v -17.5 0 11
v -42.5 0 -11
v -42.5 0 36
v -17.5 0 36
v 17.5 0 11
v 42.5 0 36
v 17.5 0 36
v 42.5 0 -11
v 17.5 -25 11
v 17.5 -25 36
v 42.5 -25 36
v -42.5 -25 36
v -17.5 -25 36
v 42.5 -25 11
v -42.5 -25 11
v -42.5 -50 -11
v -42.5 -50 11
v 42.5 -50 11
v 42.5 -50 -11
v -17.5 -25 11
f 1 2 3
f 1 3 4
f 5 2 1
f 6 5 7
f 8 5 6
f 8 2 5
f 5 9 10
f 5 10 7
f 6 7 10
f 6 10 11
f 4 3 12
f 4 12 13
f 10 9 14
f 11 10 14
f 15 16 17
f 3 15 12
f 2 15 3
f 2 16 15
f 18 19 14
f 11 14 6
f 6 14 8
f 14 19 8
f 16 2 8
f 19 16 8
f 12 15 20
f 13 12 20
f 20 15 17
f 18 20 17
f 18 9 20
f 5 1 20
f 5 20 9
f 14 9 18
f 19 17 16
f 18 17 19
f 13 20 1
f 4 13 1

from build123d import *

# Parameters (mm, degrees)
F0_W     = 85
F0_H     = 22
F1_DEPTH = 50
F2_W     = 25
F2_H     = 25
F3_DEPTH = 25
F4_W     = 25
F4_H     = 25
F5_DEPTH = 25


with BuildPart() as f1:
    # F0 (on Front) → F1 (new body)
    with BuildSketch(Plane.XZ):
        Rectangle(F0_W, F0_H)
    extrude(amount=F1_DEPTH)

    # F2 (on face) → F3 (join)
    with BuildSketch(Plane.XY.offset(11)):
        with Locations((30, -12.5)):
            Rectangle(F2_W, F2_H)
    extrude(amount=F3_DEPTH)

    # F4 (on face) → F5 (join)
    with BuildSketch(Plane.XY.offset(11)):
        with Locations((-30, -12.5)):
            Rectangle(F4_W, F4_H)
    extrude(amount=F5_DEPTH)


solid = f1.part
